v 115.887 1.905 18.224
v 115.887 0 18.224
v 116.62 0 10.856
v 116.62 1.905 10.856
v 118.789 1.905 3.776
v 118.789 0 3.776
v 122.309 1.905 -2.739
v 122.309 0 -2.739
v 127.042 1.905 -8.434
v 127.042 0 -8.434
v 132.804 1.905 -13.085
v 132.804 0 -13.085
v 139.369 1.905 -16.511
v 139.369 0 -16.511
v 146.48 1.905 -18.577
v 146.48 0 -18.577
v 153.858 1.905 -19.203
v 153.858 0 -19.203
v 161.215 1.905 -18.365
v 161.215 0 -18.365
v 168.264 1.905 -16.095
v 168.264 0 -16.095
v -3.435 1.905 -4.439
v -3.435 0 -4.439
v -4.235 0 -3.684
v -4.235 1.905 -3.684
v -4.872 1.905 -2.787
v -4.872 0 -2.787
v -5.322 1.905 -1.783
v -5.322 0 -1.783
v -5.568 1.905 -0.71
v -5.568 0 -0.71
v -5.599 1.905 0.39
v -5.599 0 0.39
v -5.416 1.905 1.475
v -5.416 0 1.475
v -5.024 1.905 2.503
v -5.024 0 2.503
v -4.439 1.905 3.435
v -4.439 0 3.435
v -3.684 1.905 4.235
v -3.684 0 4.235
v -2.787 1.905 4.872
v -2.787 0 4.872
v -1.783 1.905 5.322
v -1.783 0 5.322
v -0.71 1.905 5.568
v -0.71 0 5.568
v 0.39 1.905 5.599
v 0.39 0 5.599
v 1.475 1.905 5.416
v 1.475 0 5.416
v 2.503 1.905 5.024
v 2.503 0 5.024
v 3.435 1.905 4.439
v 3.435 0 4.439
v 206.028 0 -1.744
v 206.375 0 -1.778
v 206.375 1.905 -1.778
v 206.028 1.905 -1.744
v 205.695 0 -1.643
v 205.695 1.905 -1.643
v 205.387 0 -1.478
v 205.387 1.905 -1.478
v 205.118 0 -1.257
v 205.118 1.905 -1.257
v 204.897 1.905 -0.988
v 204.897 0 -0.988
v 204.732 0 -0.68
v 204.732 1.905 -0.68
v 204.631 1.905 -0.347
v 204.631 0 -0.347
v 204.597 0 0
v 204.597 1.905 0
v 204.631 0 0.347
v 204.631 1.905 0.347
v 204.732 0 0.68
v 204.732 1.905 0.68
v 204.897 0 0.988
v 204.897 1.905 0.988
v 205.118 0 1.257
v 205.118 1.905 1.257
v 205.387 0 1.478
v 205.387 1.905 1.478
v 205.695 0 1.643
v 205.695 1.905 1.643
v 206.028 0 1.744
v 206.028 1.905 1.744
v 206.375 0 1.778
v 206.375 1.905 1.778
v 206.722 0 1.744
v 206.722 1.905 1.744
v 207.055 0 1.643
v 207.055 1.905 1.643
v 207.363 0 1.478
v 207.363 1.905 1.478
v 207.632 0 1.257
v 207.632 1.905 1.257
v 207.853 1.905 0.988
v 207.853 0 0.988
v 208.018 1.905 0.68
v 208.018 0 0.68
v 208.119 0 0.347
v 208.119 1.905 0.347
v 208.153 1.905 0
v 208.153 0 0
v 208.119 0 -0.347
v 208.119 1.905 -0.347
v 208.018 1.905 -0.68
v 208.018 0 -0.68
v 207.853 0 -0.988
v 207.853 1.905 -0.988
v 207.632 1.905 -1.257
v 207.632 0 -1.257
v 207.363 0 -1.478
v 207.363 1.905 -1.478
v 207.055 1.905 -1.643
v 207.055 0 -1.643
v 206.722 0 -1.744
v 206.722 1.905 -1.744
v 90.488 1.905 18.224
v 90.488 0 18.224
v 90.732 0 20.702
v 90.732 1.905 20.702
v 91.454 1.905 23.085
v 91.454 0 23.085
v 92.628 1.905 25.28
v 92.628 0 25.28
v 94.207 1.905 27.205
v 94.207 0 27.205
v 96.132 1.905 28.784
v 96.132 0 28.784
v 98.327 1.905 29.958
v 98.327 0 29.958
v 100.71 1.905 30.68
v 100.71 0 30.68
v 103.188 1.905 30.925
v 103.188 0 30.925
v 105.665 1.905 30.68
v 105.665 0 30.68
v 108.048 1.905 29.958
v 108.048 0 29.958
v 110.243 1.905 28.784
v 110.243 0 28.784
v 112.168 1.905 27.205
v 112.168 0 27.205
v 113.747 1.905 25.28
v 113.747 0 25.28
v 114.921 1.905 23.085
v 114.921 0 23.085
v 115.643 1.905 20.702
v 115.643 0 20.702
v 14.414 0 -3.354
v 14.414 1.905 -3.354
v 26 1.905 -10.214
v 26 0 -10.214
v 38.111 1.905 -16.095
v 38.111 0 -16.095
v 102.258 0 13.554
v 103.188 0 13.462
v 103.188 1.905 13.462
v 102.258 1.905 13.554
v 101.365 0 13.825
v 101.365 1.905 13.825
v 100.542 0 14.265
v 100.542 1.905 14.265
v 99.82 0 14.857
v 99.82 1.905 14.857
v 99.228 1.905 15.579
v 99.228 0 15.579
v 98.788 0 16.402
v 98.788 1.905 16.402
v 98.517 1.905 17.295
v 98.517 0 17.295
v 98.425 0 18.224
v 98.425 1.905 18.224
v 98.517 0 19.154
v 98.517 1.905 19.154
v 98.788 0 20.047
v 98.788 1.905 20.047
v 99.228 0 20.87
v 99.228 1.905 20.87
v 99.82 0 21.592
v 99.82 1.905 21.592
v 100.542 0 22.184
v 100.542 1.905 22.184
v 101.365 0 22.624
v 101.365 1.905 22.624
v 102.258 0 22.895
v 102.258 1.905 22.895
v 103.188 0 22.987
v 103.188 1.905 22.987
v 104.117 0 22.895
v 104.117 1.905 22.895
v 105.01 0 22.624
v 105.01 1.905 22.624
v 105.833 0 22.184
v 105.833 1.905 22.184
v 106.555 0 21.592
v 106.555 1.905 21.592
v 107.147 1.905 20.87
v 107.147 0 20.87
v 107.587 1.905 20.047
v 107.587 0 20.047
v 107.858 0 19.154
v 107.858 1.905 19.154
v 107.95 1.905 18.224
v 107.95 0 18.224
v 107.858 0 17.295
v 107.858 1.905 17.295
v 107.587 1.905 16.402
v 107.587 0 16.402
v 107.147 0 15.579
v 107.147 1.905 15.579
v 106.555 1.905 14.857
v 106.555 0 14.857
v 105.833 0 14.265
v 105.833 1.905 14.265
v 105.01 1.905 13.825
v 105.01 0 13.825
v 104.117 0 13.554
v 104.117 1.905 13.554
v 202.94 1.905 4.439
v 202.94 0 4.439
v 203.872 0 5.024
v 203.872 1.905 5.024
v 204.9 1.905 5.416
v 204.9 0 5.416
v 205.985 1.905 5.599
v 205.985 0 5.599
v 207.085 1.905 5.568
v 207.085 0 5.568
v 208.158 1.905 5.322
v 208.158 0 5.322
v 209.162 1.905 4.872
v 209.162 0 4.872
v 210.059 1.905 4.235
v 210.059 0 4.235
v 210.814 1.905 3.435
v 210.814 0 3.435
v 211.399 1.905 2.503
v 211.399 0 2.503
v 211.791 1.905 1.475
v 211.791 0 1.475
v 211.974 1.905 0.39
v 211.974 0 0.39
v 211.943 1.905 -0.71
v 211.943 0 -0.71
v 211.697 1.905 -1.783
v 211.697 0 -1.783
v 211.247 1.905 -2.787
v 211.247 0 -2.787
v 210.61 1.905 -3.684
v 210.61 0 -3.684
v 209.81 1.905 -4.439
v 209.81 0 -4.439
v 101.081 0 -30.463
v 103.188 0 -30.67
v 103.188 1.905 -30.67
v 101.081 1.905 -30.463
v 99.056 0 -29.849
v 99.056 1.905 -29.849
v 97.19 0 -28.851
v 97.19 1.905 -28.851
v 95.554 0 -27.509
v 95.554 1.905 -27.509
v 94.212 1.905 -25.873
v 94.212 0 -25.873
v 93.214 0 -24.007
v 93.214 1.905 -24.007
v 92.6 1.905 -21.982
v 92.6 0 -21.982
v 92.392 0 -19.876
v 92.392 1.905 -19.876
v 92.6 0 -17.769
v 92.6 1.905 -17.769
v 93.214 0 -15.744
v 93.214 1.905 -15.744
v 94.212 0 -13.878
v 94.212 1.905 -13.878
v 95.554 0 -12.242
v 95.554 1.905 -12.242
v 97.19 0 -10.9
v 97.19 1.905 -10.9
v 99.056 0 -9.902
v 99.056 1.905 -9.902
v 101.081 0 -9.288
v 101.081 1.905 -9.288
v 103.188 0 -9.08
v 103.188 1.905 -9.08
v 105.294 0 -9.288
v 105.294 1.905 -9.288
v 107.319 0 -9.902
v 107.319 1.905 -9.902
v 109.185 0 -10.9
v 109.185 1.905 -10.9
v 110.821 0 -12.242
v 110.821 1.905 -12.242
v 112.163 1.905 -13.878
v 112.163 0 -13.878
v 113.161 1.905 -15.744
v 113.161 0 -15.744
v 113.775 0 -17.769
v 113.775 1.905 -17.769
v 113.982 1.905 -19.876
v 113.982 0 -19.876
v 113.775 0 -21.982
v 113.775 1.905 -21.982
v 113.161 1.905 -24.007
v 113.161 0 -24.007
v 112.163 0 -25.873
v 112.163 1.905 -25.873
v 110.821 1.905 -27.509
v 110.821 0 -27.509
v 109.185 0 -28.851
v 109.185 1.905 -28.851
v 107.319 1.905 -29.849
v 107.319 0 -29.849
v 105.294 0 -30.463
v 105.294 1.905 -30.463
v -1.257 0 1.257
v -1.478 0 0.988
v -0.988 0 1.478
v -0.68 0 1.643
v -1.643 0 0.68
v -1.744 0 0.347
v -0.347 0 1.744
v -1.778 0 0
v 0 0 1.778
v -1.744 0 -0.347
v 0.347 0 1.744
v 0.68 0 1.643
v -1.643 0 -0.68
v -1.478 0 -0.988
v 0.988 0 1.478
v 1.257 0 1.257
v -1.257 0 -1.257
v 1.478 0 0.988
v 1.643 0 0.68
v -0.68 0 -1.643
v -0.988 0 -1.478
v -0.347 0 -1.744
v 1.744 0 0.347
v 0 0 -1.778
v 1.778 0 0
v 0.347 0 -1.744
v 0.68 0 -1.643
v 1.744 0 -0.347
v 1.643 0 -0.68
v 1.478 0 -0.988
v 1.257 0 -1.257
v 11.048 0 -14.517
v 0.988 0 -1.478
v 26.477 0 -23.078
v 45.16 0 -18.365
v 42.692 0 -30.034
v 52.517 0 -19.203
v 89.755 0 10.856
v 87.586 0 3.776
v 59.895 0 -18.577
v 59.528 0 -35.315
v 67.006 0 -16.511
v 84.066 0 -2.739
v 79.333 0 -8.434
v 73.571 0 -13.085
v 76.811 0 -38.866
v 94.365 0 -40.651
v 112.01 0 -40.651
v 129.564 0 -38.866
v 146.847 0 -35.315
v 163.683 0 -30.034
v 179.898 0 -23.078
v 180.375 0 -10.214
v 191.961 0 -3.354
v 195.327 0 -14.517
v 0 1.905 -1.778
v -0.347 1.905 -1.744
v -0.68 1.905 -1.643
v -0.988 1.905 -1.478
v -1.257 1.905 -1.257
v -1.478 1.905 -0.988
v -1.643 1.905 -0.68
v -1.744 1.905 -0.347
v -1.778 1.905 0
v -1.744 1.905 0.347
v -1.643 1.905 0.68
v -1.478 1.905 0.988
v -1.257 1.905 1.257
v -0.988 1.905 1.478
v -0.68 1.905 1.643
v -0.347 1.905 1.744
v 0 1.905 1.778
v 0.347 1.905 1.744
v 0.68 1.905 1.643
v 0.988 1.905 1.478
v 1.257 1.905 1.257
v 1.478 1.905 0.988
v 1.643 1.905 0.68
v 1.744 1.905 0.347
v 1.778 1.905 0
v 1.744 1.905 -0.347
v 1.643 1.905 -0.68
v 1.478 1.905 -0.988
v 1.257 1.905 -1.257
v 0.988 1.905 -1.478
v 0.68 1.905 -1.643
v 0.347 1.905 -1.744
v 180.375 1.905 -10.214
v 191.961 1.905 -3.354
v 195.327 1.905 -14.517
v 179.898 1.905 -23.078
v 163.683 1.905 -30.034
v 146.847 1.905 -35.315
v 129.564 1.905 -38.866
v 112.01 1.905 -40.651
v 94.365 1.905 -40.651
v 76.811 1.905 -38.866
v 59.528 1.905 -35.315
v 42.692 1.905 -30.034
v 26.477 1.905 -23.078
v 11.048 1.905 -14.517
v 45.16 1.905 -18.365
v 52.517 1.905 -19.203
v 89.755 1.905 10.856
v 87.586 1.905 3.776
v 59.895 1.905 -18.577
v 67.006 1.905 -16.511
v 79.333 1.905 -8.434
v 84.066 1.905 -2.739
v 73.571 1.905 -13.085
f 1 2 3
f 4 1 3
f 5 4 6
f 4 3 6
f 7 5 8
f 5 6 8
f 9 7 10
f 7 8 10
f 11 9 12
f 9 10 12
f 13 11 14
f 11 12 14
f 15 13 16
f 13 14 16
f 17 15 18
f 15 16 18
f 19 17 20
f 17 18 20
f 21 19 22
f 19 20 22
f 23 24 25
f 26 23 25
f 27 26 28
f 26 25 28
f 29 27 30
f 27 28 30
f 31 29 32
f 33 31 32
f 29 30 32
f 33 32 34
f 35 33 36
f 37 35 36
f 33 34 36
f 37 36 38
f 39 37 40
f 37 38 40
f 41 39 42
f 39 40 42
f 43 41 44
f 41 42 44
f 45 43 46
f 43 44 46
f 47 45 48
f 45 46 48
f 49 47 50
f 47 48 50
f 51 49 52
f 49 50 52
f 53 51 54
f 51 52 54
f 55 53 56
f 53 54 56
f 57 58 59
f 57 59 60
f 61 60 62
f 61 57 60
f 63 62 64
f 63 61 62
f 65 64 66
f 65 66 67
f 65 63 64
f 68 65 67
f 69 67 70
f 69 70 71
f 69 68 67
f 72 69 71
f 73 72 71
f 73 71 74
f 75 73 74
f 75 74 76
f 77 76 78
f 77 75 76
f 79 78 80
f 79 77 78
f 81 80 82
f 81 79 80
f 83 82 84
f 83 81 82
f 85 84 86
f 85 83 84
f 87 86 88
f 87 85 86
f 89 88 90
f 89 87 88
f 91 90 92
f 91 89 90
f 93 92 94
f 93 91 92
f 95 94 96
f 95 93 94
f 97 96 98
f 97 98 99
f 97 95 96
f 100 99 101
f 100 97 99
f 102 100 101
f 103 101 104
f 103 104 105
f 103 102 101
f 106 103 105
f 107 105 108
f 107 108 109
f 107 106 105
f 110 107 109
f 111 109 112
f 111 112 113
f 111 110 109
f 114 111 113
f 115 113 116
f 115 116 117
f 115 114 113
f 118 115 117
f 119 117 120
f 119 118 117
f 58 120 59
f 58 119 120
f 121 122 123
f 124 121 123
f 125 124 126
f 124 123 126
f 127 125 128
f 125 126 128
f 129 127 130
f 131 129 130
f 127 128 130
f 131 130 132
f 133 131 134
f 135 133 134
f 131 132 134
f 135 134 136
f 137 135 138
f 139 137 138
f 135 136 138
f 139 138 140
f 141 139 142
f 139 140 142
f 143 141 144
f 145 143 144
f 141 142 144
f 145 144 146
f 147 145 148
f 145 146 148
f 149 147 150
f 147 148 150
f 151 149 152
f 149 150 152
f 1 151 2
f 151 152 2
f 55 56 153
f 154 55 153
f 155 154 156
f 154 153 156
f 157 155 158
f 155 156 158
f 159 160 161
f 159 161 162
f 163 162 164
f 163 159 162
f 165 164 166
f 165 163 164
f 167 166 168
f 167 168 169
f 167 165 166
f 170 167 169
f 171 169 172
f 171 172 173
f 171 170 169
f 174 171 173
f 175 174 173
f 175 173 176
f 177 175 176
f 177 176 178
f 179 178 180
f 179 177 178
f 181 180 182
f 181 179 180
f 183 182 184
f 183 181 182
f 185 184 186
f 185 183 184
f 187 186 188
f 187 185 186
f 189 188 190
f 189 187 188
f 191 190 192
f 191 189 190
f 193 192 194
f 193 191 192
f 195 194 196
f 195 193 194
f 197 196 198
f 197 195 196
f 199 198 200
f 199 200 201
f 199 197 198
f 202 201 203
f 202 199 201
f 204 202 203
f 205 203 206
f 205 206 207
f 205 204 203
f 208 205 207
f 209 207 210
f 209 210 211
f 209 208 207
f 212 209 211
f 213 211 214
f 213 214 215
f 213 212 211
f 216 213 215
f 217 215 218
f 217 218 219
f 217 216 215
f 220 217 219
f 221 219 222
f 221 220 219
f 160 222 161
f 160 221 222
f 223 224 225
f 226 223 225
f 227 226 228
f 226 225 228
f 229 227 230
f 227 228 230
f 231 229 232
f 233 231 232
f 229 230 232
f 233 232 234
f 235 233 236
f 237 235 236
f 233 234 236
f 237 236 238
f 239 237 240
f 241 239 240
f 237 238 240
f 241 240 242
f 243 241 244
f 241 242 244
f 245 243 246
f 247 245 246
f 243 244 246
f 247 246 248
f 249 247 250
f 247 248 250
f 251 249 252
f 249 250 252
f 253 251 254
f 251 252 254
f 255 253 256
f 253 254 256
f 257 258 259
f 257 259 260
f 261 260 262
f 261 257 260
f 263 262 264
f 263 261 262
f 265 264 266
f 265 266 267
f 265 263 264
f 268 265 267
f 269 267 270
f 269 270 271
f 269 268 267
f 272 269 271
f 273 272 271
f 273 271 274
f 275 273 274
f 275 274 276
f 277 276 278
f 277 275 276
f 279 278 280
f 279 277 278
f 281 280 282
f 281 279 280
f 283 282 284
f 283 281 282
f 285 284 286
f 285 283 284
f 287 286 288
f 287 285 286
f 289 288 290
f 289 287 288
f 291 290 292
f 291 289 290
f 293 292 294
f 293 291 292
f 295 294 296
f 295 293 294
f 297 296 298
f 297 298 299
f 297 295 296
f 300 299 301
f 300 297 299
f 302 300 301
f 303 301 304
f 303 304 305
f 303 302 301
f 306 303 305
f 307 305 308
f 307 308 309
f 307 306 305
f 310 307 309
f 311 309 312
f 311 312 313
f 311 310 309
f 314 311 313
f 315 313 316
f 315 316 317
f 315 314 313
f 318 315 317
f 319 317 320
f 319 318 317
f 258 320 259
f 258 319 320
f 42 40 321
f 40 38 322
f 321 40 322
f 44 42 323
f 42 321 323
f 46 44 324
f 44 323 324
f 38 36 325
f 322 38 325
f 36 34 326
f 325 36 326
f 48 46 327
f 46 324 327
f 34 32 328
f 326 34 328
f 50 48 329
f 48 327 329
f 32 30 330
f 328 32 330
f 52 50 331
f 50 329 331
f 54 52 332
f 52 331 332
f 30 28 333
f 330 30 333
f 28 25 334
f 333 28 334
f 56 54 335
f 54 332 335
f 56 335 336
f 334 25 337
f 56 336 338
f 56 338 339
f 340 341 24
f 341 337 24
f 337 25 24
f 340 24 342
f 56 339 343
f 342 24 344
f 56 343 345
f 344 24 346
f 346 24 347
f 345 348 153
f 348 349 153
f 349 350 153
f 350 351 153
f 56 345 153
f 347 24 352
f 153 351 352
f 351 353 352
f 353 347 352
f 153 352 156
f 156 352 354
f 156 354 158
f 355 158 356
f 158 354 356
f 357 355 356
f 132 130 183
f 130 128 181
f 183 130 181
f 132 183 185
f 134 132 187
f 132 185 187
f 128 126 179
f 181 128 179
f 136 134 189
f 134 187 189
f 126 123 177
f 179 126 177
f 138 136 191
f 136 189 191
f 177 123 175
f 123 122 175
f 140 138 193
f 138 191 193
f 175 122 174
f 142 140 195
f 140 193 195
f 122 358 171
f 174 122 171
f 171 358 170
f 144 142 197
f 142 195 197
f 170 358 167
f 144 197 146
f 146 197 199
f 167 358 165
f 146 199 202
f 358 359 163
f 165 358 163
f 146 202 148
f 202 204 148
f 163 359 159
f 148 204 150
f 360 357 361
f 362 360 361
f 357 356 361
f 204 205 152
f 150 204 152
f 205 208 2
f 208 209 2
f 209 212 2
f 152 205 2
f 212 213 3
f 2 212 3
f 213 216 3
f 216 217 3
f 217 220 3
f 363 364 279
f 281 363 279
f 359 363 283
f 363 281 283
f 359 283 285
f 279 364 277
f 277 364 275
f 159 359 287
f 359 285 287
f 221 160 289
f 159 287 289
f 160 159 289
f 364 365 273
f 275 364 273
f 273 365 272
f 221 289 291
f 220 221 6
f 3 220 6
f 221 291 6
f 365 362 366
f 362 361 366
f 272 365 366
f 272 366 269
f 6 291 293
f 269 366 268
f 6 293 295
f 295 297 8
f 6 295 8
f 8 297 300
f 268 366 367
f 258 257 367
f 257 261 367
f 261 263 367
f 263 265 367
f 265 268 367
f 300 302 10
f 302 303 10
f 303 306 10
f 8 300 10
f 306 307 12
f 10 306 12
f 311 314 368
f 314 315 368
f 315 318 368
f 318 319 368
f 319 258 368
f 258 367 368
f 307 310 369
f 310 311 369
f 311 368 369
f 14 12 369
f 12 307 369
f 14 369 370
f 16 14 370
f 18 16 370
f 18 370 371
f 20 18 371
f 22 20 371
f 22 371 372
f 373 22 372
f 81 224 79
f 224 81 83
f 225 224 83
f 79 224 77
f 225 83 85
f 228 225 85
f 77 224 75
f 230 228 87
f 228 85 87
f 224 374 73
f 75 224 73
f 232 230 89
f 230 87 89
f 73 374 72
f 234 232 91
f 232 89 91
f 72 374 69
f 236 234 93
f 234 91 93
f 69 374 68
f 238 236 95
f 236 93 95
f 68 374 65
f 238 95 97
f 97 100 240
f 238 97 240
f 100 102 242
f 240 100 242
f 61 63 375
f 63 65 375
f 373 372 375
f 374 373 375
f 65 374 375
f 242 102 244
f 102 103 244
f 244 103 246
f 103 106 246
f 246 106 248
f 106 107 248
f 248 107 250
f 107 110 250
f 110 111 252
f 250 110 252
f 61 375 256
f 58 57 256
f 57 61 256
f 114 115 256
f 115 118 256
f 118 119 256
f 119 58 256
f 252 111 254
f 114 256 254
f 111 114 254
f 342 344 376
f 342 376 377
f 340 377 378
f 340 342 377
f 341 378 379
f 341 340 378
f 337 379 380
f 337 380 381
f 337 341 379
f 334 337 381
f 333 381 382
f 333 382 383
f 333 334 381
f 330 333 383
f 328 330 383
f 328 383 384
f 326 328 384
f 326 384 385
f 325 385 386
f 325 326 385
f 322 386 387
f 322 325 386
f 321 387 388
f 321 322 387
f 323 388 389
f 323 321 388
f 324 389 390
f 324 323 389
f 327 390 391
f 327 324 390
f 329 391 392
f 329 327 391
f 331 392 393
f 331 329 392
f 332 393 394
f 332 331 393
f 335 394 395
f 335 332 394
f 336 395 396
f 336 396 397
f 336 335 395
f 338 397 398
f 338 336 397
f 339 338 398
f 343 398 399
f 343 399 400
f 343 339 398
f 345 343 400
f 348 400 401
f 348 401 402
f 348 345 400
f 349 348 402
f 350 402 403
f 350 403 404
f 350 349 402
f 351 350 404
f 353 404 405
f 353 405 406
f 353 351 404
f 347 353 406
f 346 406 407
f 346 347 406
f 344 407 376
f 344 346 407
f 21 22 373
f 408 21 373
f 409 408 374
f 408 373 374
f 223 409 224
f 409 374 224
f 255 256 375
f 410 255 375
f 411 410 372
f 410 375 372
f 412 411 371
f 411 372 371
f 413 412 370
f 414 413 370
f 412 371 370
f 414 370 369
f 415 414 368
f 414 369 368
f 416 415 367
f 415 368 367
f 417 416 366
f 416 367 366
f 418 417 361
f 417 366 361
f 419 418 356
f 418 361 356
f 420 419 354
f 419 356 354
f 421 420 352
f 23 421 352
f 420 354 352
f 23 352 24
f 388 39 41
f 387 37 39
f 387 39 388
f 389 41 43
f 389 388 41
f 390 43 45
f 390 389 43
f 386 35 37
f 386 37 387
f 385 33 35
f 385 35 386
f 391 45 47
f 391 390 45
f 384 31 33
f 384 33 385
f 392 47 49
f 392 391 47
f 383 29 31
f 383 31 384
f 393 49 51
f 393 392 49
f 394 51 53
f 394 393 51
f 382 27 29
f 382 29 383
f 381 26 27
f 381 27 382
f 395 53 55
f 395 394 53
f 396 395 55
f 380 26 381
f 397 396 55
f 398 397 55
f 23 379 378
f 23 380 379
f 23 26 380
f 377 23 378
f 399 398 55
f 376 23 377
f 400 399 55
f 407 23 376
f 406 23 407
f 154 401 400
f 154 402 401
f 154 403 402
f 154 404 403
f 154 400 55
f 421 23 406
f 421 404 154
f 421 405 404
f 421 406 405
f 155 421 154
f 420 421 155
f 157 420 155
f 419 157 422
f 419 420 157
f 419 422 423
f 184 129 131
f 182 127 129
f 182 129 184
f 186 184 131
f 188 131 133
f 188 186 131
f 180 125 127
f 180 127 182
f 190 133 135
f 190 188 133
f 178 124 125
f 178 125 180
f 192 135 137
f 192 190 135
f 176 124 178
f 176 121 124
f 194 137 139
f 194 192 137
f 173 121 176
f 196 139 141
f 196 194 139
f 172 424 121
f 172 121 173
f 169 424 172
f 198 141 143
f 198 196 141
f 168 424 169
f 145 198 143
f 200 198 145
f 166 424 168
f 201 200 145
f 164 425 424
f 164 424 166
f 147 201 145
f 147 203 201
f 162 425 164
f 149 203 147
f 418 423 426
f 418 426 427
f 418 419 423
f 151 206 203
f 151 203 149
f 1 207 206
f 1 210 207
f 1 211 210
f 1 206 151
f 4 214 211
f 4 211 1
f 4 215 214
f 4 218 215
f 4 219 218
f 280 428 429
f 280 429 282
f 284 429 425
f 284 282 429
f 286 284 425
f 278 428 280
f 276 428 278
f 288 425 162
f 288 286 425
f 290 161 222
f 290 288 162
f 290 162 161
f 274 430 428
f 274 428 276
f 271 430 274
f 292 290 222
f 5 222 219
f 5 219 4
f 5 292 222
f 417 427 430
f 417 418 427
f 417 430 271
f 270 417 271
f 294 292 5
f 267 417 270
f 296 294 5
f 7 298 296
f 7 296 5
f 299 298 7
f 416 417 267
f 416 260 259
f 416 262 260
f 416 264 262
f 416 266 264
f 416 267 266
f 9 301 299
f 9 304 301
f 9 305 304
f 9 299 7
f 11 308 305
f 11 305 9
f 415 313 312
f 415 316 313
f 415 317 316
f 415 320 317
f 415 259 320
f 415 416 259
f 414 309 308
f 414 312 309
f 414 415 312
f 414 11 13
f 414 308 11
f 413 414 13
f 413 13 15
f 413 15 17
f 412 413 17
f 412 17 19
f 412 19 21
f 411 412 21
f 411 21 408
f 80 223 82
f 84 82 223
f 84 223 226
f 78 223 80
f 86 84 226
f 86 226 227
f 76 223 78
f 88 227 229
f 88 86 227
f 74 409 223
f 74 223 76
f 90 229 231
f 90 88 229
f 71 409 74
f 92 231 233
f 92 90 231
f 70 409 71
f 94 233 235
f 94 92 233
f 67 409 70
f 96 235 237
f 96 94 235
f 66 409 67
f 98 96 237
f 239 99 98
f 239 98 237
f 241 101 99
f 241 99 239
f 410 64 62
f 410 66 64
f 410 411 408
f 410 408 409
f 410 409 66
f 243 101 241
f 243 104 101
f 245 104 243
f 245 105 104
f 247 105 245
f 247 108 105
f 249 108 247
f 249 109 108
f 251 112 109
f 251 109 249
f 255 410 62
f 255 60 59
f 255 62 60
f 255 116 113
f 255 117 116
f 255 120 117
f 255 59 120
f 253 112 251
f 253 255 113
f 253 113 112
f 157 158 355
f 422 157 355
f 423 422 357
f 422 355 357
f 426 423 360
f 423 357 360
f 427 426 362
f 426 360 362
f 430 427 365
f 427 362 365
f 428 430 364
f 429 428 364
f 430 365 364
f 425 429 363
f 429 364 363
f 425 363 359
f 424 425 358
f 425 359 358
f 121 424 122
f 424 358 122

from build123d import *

# Parameters (mm, degrees)
SKETCH1_R           = 1.778
SKETCH1_R_2         = 4.7625
SKETCH1_R_3         = 10.795
BOSS_EXTRUDE1_DEPTH = 1.905


with BuildPart() as part:
    # Sketch1 → Boss-Extrude1 (new body)
    with BuildSketch(Plane(origin=(0, 0, 0), x_dir=(1, 0, 0), z_dir=(0, 1, 0))):
        with BuildLine():
            ThreePointArc((-3.434964073, 4.439030494), (-4.439030494, -3.434964073), (3.434964073, -4.439030494))
            ThreePointArc((3.434964073, -4.439030494), (20.136115591, 6.903606124), (38.111342378, 16.094639222))
            ThreePointArc((38.111342378, 16.094639222), (73.570878275, 13.084704733), (90.4875, -18.2245))
            ThreePointArc((90.4875, -18.2245), (103.1875, -30.9245), (115.8875, -18.2245))
            ThreePointArc((115.8875, -18.2245), (132.804121725, 13.084704733), (168.263657622, 16.094639222))
            ThreePointArc((168.263657622, 16.094639222), (186.238884409, 6.903606124), (202.940035927, -4.439030494))
            ThreePointArc((202.940035927, -4.439030494), (210.814030494, -3.434964073), (209.809964073, 4.439030494))
            ThreePointArc((209.809964073, 4.439030494), (103.1875, 40.874472361), (-3.434964073, 4.439030494))
        make_face()
        with Locations(Location((0, 0, 0), (0, 0, 90))):
            Circle(SKETCH1_R, mode=Mode.SUBTRACT)
        with Locations(Location((206.375, 0, 0), (0, 0, 90))):
            Circle(SKETCH1_R, mode=Mode.SUBTRACT)
        with Locations(Location((103.1875, -18.2245, 0), (0, 0, 90))):
            Circle(SKETCH1_R_2, mode=Mode.SUBTRACT)
        with Locations(Location((103.1875, 19.8755, 0), (0, 0, 90))):
            Circle(SKETCH1_R_3, mode=Mode.SUBTRACT)
    extrude(amount=BOSS_EXTRUDE1_DEPTH)


solid = part.part
